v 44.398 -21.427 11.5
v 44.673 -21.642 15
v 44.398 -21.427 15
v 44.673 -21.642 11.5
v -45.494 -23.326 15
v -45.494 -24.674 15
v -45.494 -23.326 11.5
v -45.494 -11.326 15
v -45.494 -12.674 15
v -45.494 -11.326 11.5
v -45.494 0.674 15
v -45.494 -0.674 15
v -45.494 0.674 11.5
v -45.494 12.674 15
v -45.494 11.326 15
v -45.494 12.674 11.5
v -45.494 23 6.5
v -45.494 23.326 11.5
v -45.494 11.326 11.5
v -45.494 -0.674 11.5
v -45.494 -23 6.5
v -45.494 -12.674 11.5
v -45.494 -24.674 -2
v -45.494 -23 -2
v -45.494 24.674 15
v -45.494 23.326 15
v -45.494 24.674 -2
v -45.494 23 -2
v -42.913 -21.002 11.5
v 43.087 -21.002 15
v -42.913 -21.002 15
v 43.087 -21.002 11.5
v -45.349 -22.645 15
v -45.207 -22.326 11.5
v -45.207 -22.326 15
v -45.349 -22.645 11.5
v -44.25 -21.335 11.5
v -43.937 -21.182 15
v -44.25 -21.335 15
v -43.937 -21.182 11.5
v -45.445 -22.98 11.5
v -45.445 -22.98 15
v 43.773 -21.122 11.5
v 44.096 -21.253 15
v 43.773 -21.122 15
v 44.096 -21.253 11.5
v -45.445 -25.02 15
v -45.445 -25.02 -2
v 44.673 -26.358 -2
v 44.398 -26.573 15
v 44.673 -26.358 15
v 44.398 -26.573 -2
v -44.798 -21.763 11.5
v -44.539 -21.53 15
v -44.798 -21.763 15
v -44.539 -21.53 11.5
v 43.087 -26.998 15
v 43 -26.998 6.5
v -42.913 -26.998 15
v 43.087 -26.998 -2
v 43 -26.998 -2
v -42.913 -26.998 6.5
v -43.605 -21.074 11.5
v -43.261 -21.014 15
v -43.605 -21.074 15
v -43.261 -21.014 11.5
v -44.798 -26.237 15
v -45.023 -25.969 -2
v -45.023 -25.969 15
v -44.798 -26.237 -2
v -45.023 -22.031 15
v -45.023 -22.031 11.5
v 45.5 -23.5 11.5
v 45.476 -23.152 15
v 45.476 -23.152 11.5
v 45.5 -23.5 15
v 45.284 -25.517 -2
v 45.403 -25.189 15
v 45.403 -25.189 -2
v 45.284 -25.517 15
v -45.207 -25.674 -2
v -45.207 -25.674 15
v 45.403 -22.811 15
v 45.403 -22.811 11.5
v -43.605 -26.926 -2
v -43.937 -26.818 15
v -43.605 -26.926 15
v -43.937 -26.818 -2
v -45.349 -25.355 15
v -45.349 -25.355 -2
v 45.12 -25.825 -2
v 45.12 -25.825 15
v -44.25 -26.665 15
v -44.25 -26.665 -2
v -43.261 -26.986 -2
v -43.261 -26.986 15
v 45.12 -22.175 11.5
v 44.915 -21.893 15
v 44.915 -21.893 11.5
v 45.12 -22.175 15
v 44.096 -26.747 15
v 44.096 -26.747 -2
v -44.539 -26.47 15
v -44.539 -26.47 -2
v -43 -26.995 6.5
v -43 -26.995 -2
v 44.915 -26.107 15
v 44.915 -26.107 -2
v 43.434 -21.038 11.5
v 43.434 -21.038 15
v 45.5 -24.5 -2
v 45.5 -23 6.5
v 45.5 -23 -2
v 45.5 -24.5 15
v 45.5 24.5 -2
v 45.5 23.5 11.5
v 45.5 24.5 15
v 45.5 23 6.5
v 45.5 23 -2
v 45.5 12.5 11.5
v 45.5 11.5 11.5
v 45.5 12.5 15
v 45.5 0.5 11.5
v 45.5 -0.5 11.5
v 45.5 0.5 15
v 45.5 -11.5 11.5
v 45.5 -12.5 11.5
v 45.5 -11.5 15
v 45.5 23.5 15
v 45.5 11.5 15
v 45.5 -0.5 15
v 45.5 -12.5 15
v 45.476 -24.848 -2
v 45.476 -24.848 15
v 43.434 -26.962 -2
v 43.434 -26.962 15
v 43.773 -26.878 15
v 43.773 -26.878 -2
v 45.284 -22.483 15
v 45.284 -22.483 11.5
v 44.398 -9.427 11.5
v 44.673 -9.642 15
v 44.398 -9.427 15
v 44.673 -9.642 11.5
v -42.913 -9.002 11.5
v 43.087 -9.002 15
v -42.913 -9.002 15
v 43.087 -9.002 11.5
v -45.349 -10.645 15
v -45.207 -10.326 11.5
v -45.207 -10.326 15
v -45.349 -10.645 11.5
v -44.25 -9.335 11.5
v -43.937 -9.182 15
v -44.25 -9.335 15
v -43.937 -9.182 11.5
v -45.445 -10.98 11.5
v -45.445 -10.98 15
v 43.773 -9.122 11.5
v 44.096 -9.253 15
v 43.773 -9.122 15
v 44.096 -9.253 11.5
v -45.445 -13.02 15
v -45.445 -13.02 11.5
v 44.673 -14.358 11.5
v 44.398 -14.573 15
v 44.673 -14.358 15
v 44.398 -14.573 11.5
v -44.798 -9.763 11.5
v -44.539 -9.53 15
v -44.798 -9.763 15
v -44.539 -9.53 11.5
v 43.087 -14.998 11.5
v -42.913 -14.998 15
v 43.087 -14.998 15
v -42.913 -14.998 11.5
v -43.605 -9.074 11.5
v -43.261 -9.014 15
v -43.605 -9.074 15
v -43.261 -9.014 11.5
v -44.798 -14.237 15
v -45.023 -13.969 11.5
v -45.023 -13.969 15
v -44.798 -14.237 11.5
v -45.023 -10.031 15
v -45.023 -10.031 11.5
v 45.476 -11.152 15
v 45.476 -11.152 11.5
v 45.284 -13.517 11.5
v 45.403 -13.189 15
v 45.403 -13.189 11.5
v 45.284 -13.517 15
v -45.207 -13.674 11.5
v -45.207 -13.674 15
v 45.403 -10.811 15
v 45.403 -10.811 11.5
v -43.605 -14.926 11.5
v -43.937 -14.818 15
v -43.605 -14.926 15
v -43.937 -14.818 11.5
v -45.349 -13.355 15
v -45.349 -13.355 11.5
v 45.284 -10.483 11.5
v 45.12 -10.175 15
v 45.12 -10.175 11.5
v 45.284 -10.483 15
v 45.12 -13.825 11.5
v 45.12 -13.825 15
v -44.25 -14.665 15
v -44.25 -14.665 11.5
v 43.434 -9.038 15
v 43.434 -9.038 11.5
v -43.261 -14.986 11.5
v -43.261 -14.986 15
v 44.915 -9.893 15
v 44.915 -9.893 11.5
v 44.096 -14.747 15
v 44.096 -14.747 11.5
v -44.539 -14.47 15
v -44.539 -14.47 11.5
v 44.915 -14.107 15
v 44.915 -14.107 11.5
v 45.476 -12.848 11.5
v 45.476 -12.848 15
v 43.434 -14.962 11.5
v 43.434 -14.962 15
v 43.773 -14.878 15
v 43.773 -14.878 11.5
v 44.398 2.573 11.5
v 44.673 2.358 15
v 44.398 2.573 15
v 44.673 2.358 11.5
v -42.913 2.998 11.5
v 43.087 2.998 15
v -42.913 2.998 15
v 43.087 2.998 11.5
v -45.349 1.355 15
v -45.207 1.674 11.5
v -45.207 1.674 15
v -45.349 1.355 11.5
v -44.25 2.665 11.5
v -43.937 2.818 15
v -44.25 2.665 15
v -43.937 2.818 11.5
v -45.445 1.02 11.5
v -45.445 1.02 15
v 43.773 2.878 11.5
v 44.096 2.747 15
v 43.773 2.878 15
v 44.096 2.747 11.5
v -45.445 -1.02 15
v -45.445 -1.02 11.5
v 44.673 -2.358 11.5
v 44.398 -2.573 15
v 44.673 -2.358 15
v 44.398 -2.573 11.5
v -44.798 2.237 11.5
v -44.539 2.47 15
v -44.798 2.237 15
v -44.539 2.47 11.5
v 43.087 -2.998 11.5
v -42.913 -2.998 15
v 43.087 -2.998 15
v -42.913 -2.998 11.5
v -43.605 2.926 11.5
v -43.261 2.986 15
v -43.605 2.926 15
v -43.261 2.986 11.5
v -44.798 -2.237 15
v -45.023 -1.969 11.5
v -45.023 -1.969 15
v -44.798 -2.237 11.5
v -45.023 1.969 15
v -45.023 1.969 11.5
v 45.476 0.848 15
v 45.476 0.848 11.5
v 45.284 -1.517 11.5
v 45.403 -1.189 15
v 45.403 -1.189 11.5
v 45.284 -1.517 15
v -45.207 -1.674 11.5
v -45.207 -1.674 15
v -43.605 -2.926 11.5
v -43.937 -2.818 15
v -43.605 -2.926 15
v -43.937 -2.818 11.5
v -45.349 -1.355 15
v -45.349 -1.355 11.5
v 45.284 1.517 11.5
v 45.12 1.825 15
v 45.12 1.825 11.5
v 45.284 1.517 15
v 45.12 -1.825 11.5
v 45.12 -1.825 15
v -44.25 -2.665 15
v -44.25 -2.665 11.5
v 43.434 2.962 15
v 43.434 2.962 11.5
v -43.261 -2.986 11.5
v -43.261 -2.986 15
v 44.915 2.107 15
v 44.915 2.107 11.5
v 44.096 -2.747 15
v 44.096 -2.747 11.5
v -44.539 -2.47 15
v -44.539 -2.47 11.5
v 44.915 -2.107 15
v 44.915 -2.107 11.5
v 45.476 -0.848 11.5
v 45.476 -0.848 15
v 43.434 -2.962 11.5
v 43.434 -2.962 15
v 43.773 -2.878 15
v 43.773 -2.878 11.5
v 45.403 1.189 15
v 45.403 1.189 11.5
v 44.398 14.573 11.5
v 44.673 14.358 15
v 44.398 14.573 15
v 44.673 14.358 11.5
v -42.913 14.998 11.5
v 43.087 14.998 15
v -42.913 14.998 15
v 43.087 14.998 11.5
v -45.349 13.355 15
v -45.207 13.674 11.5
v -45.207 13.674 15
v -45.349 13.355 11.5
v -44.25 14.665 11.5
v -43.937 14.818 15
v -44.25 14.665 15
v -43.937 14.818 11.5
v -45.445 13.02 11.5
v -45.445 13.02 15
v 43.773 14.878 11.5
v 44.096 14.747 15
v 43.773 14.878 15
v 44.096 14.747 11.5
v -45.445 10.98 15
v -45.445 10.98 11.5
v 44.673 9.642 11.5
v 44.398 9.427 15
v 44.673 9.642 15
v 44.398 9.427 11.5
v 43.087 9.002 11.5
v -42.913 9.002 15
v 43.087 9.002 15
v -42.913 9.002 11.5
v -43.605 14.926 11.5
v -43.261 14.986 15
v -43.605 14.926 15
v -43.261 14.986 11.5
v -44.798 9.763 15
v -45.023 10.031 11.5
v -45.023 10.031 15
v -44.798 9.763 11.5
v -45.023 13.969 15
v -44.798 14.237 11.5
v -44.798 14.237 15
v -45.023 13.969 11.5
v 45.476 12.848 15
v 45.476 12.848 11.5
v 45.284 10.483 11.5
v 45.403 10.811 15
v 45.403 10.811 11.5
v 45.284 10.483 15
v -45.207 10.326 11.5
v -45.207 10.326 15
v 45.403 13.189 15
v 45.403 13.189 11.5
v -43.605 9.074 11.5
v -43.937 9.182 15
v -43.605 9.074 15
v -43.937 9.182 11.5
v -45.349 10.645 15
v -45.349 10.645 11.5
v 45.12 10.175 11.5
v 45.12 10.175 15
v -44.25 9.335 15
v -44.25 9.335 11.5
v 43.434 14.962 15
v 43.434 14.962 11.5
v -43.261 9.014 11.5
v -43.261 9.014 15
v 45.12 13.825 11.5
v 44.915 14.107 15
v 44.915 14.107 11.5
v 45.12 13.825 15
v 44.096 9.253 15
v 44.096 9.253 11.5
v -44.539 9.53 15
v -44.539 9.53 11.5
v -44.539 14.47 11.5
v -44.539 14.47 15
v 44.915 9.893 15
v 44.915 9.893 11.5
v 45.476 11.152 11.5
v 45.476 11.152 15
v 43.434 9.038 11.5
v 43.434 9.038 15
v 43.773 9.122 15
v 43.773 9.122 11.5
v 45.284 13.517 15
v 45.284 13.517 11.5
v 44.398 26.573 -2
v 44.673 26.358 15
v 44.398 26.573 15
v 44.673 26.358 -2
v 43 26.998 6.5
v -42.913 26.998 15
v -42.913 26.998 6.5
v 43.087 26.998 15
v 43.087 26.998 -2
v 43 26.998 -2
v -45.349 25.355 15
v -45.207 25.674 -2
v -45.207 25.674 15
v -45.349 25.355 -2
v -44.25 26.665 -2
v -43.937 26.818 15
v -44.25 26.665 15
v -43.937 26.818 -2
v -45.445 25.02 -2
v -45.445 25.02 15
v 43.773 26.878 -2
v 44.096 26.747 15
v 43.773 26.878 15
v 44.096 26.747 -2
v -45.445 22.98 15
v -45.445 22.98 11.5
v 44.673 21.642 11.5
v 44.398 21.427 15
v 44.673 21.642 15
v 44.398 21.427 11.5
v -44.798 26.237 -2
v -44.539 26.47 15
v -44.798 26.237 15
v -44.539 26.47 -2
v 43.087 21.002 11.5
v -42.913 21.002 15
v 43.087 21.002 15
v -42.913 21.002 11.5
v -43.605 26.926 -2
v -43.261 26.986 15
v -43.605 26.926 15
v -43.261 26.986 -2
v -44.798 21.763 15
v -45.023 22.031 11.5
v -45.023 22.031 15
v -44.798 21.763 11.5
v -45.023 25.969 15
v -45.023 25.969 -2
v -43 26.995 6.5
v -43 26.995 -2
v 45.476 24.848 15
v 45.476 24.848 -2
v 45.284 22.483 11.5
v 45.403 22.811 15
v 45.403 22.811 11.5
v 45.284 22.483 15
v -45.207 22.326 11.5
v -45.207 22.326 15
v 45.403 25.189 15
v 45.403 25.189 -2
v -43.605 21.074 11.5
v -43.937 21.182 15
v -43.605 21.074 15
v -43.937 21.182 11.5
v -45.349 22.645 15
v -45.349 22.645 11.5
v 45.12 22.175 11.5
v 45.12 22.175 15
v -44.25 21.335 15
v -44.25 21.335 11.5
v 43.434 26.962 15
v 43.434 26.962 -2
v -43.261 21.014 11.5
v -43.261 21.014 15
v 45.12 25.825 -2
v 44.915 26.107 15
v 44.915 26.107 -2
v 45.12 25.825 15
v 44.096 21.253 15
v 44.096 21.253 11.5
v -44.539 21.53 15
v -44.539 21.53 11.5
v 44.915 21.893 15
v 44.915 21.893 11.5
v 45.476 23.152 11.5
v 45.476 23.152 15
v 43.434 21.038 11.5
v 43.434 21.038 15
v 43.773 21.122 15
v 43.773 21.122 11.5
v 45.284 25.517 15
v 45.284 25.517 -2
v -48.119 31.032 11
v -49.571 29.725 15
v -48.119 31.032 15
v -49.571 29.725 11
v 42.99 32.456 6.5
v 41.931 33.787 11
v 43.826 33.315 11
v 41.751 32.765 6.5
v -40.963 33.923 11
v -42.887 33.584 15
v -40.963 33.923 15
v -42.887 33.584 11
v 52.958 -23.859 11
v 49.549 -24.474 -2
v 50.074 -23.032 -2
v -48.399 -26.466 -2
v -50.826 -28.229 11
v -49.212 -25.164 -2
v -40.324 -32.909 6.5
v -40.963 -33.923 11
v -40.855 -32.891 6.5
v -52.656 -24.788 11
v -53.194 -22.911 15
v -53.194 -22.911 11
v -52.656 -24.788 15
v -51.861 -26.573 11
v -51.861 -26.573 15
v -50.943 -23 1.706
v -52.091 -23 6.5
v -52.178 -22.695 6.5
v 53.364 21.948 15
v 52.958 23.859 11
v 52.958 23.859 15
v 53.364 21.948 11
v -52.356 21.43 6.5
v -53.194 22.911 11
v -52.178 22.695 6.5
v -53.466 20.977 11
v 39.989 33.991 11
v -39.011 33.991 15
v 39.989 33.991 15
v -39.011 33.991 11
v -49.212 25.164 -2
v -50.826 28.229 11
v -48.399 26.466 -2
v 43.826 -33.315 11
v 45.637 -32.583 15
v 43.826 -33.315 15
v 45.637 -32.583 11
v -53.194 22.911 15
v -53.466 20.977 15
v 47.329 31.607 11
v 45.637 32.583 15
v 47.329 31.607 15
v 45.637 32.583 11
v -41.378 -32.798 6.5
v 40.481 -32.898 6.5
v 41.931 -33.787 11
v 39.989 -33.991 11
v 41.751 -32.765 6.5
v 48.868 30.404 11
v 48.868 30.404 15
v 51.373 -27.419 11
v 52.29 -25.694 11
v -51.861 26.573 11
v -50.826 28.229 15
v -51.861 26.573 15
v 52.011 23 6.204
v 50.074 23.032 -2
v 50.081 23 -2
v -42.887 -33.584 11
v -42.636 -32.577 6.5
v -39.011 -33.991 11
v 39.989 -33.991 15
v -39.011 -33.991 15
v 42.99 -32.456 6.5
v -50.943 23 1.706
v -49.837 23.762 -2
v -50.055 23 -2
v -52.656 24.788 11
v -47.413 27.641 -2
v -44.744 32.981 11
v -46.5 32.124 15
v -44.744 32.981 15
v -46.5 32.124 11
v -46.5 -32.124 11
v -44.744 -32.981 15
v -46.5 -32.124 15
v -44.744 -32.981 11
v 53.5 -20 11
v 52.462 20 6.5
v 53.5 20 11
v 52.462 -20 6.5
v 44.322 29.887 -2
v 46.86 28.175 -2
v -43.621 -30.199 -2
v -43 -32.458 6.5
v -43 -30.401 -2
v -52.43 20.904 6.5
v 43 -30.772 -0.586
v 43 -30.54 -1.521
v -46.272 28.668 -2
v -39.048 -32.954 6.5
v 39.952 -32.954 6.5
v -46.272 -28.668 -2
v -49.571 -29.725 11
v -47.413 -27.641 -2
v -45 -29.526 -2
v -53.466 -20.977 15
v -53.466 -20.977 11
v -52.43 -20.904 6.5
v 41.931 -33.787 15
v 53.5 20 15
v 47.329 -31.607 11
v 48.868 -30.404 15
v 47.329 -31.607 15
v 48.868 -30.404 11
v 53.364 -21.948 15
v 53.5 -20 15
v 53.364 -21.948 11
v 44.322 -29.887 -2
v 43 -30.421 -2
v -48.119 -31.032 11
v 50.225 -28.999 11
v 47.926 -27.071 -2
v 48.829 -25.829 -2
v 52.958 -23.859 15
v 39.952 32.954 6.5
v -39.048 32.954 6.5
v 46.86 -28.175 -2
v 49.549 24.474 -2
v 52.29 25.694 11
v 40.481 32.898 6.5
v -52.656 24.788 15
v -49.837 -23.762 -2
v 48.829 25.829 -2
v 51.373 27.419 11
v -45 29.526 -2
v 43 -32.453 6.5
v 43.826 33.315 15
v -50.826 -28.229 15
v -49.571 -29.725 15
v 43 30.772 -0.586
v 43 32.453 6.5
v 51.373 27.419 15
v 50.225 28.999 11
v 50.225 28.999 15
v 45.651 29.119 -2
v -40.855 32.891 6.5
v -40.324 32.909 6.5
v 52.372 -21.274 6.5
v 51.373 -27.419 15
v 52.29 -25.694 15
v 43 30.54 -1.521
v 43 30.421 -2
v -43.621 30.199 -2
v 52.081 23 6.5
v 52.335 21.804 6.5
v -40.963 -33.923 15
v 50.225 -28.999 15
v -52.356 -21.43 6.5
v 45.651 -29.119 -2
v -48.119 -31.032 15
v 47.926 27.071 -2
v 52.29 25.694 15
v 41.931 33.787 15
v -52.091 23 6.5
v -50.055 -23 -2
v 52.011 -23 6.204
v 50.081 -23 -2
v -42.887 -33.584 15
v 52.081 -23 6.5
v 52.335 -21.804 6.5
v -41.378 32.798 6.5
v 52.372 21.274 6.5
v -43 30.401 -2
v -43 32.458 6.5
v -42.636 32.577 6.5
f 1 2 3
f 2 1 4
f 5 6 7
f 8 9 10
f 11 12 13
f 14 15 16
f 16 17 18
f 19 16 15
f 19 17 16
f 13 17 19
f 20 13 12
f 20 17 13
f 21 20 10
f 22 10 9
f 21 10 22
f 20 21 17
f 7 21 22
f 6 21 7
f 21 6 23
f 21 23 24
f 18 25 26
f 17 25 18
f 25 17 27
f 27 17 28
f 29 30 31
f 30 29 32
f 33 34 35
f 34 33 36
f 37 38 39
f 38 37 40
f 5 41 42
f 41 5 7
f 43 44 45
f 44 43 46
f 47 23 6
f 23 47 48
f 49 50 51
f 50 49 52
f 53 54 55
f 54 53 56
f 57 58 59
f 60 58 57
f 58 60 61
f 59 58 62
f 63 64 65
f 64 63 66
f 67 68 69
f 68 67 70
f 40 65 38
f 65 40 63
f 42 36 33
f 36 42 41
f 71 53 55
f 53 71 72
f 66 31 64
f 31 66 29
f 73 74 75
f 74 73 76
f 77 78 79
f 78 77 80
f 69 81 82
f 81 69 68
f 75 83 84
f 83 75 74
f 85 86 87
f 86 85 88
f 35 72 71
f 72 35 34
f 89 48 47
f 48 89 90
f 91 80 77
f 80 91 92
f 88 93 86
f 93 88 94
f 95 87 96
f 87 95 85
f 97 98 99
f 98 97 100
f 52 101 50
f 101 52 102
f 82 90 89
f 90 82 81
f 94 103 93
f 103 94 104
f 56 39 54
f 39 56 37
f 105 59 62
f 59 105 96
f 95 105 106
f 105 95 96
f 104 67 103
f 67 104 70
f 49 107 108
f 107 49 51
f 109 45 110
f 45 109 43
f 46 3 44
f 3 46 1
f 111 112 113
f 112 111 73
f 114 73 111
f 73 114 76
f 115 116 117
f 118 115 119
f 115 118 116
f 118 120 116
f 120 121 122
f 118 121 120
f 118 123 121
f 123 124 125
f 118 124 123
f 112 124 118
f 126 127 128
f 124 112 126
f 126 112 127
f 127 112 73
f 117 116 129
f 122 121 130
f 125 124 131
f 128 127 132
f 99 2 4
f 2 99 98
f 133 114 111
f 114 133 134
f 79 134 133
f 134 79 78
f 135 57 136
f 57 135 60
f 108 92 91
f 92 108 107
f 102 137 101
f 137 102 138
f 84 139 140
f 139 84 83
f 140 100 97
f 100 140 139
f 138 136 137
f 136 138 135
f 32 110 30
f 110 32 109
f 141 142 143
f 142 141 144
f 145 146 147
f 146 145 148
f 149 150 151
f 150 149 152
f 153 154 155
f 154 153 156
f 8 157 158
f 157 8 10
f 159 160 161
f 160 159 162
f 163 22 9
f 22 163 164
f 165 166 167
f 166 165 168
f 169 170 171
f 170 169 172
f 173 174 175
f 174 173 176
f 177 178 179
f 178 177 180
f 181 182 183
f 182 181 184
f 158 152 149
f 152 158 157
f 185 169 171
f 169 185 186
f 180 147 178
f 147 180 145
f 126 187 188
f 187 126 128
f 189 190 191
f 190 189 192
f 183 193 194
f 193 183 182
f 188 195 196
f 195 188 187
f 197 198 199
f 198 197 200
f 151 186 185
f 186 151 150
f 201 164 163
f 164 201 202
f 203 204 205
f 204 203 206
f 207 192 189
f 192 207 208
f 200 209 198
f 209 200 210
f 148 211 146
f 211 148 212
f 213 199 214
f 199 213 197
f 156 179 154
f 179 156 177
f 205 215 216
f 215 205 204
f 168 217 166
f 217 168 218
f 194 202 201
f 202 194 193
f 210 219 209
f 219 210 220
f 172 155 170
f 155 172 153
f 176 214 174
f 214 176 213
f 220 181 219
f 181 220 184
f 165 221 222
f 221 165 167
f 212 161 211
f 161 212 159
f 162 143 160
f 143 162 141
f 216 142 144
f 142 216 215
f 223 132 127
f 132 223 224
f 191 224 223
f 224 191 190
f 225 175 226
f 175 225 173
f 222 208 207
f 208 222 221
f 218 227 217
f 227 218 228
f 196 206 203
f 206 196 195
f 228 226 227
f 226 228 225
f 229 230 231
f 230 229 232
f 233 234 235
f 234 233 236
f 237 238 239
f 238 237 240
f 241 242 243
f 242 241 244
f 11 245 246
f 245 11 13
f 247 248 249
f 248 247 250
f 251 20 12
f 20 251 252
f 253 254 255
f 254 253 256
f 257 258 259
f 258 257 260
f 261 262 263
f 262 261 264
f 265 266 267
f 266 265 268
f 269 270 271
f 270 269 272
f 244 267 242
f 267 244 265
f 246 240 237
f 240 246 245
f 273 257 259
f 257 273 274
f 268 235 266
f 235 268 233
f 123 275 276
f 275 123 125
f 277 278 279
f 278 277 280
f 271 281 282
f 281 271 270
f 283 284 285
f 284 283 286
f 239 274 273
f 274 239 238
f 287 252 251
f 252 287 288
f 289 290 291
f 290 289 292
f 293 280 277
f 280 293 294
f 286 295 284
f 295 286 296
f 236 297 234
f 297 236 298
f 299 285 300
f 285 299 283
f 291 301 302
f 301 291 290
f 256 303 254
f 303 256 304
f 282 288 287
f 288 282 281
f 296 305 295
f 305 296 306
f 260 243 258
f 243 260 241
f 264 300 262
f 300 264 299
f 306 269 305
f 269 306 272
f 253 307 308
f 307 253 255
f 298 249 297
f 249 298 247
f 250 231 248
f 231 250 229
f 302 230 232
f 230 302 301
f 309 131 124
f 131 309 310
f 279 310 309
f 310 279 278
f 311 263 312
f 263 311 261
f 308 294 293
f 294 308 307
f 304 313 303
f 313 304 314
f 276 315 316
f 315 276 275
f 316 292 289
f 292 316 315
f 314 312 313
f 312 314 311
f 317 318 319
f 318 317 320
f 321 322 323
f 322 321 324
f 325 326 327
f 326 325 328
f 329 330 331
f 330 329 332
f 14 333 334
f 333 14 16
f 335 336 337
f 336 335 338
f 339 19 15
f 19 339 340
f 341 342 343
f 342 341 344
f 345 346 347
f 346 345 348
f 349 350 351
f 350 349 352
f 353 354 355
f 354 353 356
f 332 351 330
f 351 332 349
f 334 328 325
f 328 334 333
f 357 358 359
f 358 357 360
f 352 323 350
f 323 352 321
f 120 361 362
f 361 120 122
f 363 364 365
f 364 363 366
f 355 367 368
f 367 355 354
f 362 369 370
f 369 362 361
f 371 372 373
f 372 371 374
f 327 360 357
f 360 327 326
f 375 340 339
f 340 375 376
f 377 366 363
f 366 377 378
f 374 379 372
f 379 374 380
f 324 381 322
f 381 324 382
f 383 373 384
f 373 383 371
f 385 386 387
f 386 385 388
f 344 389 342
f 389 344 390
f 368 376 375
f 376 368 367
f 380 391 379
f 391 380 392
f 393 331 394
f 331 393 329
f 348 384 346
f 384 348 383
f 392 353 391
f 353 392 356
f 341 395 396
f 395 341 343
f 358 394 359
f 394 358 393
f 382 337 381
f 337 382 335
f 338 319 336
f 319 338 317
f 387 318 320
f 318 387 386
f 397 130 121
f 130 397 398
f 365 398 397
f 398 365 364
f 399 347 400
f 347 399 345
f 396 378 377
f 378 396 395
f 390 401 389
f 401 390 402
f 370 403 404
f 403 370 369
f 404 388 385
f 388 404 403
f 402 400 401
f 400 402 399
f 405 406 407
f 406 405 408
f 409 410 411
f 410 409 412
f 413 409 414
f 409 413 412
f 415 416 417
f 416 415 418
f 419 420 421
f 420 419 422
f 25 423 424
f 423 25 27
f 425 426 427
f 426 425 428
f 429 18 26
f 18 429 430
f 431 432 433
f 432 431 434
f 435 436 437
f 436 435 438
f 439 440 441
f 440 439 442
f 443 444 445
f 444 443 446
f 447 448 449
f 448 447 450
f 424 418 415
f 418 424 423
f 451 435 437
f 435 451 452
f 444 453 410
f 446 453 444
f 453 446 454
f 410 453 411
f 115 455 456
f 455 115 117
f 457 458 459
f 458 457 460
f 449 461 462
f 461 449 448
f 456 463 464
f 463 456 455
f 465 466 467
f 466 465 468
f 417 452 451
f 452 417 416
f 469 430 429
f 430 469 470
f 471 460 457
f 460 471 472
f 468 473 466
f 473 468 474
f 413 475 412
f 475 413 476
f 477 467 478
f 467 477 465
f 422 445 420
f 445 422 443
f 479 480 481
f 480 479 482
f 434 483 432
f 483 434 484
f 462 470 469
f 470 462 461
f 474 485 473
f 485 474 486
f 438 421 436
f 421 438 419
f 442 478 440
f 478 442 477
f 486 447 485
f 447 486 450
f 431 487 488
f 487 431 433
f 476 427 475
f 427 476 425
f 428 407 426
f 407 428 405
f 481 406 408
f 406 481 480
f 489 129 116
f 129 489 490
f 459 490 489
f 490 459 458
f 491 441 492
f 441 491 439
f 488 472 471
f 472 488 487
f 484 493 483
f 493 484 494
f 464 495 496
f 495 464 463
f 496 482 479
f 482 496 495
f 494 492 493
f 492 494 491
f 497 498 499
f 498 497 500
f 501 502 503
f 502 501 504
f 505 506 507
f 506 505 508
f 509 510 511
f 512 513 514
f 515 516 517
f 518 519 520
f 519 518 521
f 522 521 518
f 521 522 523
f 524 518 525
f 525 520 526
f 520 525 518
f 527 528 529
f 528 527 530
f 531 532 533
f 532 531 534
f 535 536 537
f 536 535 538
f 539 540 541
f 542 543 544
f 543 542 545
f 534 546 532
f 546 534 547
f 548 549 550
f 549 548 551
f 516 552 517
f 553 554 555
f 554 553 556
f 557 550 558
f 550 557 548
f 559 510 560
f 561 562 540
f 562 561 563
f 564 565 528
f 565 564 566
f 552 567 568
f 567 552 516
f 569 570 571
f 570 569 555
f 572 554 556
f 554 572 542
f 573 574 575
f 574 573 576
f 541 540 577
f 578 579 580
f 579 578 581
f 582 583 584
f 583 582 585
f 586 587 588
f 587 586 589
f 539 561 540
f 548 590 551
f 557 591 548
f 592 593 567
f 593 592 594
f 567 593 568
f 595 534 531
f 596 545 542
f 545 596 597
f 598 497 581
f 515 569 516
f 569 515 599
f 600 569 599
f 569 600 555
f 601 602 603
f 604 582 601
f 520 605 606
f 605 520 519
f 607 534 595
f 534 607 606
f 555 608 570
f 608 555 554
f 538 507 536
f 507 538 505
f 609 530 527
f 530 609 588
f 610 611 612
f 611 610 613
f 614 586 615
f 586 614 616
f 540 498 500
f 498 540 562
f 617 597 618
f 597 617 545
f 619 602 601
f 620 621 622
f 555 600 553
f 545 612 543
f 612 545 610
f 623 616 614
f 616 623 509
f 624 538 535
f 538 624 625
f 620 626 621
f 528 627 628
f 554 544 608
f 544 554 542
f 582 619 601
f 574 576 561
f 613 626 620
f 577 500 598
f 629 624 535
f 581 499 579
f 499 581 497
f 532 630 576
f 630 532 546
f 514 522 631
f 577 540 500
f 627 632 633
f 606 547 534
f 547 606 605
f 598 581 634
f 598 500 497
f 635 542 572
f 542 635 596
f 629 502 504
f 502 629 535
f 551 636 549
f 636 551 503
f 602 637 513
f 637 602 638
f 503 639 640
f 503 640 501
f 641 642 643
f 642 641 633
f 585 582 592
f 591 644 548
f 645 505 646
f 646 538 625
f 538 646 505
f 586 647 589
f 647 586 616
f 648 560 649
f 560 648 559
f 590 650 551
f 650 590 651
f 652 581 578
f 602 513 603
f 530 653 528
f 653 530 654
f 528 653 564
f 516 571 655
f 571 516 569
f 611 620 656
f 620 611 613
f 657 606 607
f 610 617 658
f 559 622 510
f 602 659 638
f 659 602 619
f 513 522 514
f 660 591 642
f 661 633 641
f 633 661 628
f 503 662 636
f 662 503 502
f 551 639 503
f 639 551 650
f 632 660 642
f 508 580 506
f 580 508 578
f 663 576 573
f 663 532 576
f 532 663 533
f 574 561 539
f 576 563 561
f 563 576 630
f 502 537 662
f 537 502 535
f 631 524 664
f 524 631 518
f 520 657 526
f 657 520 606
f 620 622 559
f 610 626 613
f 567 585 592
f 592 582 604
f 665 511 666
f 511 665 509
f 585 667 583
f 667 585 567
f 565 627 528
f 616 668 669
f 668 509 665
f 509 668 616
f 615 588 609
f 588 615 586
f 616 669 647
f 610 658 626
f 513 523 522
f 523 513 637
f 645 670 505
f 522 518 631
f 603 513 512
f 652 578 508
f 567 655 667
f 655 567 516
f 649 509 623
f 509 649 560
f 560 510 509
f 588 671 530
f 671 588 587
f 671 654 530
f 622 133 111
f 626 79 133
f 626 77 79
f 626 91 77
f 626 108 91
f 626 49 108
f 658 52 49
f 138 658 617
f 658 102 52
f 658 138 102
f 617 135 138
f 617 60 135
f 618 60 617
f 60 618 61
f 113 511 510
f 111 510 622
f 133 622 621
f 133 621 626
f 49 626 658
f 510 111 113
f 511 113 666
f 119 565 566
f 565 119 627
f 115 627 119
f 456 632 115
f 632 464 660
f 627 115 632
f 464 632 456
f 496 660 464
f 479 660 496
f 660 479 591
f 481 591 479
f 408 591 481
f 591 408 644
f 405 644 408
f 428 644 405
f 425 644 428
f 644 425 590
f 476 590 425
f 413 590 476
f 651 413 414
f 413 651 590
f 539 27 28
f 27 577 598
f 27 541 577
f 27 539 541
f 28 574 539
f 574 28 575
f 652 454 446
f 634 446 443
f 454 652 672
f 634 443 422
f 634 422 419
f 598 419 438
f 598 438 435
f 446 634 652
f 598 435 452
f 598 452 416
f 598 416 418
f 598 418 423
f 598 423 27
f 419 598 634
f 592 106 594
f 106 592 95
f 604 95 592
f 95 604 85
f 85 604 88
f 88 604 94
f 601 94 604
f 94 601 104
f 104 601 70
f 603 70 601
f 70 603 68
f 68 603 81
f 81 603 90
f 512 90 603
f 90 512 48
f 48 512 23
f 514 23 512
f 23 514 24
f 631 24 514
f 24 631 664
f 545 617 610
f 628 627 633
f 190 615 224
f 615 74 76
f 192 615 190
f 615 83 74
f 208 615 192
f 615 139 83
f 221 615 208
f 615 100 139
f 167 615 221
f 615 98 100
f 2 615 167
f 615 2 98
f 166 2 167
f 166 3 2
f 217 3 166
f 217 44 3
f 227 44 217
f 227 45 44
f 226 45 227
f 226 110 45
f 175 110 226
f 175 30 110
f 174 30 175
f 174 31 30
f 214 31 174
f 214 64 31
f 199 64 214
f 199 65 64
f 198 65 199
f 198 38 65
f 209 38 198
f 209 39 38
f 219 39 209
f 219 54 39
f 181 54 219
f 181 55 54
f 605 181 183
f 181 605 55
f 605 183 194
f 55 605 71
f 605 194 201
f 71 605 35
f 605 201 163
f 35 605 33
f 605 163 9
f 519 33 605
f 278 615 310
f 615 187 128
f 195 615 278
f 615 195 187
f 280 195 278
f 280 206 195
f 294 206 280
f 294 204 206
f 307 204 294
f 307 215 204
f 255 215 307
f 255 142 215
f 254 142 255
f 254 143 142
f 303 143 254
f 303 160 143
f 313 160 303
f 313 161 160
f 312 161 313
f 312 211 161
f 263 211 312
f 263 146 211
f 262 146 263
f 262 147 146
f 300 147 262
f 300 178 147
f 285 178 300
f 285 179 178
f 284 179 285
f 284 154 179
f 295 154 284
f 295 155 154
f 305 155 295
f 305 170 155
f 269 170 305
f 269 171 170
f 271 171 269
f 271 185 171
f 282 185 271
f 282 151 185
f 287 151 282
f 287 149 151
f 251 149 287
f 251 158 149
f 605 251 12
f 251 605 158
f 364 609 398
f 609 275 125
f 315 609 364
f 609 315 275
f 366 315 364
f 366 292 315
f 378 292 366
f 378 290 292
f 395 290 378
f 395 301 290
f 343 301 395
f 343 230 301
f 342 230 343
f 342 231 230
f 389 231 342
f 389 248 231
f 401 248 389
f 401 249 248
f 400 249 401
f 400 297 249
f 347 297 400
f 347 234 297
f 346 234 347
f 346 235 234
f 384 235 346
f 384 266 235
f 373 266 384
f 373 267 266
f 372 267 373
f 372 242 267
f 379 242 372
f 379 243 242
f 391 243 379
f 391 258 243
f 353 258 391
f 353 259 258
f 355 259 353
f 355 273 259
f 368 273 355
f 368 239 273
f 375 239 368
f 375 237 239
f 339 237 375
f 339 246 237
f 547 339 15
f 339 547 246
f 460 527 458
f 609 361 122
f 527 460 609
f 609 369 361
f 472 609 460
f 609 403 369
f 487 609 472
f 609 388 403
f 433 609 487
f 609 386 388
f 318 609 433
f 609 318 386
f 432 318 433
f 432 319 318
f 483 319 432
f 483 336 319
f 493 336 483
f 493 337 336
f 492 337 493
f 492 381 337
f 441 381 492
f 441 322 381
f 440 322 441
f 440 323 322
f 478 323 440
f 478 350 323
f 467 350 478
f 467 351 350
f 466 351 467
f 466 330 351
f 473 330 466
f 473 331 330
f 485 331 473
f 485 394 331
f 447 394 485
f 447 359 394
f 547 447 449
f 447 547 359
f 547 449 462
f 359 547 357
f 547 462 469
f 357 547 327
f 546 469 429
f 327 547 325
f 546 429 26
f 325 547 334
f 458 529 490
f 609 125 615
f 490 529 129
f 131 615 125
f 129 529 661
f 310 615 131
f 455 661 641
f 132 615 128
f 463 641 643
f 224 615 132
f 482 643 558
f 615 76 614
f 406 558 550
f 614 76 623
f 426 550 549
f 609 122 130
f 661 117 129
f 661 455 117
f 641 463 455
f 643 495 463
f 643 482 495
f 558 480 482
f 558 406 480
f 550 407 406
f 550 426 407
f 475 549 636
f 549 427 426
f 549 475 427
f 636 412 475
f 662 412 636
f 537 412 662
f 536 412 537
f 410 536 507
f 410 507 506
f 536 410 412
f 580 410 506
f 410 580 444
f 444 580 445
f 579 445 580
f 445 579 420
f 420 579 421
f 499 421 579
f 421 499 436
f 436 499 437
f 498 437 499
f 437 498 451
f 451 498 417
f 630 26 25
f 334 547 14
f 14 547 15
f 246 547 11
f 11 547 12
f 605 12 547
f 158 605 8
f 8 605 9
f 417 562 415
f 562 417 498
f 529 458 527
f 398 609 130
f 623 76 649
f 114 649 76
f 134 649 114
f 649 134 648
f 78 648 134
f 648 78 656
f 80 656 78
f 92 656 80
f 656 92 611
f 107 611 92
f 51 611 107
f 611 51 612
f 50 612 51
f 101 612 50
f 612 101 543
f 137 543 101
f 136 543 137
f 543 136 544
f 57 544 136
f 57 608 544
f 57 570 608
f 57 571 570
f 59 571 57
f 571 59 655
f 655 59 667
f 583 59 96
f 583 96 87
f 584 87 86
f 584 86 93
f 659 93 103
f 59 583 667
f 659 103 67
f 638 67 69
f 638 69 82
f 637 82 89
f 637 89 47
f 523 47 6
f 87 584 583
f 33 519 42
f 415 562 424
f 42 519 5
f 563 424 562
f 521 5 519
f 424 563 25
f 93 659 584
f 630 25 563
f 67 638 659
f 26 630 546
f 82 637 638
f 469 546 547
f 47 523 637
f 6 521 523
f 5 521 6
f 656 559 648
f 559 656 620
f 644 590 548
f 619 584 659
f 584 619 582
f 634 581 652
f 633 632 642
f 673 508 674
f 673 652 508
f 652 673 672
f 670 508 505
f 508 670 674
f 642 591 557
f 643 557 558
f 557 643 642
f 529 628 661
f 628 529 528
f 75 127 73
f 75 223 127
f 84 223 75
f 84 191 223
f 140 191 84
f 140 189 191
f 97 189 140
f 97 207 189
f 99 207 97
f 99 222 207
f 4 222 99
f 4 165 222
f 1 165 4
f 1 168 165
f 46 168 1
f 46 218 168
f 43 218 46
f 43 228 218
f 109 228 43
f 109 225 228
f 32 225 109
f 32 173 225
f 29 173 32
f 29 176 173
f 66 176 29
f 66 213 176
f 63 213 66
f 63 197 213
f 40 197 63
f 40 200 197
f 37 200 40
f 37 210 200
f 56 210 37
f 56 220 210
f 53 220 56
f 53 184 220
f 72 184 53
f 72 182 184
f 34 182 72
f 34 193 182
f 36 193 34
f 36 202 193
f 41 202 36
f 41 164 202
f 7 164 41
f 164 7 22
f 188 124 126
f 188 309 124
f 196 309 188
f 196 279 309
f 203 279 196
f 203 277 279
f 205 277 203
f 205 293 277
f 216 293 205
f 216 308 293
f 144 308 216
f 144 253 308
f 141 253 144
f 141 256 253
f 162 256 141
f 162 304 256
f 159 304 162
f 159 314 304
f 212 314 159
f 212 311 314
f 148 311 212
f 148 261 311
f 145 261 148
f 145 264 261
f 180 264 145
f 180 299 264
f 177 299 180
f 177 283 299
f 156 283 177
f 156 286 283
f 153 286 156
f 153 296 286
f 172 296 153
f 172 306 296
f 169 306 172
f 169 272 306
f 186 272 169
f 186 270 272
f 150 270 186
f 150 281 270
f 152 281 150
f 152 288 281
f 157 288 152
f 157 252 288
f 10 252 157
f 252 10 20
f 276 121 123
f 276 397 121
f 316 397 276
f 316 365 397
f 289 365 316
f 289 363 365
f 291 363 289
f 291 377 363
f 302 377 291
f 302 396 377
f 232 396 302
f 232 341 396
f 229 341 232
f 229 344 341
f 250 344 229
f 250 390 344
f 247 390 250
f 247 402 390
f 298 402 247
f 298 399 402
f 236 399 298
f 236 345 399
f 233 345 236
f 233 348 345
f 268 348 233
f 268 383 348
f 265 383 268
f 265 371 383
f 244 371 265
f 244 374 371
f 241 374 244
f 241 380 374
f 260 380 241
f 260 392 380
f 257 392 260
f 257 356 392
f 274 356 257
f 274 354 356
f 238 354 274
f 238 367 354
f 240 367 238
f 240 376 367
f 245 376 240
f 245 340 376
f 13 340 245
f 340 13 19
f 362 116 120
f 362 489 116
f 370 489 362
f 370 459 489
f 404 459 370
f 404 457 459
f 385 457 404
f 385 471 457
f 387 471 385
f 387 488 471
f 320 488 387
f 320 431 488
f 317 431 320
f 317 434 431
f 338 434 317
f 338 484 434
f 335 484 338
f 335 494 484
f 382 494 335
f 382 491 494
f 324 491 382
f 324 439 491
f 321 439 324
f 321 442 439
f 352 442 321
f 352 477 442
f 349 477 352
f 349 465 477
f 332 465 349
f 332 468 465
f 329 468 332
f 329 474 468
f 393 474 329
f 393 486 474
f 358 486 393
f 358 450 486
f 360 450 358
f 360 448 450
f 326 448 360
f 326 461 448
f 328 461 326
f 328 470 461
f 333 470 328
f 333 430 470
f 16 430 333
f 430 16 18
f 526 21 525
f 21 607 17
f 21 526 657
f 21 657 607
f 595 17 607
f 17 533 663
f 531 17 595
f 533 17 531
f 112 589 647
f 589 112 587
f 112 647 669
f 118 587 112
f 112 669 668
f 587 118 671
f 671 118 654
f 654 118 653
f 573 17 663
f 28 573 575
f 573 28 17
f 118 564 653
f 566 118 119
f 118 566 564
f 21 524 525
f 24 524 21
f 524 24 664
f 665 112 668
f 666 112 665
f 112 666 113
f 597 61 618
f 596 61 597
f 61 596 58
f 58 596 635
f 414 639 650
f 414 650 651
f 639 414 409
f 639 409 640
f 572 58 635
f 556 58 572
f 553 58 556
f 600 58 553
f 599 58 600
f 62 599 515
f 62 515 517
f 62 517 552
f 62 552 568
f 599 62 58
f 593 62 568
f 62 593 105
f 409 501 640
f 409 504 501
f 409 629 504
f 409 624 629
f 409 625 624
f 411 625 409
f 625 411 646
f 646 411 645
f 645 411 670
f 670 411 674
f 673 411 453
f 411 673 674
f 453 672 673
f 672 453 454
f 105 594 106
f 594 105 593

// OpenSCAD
$fn = 45;

w = 107;
h = 68;
d = 15;
e = 28;

difference() {
    minkowski() {
        cube([w - e, h - e, 4], true);
        cylinder(d1 = e - 6, d2 = e, h = d - 2);
    }
    
    translate([0, 0, -11]) minkowski() {
        cube([w - 21, h - 19, d], true);
        cylinder(d = 5, h = d);
    }

    translate([0, 0, -1]) cube([120, 46, d], true);
    translate([0, 0, -1]) cube([86, 80, d], true);
    
    for (i = [-2, -1, 0, 1, 2]) {
        translate([0, i * 12, 4]) b();
    }
}

module b() {
    minkowski() {
        cube([86, 1, d], true);
        cylinder(d = 5, h = 10);
    }
}
